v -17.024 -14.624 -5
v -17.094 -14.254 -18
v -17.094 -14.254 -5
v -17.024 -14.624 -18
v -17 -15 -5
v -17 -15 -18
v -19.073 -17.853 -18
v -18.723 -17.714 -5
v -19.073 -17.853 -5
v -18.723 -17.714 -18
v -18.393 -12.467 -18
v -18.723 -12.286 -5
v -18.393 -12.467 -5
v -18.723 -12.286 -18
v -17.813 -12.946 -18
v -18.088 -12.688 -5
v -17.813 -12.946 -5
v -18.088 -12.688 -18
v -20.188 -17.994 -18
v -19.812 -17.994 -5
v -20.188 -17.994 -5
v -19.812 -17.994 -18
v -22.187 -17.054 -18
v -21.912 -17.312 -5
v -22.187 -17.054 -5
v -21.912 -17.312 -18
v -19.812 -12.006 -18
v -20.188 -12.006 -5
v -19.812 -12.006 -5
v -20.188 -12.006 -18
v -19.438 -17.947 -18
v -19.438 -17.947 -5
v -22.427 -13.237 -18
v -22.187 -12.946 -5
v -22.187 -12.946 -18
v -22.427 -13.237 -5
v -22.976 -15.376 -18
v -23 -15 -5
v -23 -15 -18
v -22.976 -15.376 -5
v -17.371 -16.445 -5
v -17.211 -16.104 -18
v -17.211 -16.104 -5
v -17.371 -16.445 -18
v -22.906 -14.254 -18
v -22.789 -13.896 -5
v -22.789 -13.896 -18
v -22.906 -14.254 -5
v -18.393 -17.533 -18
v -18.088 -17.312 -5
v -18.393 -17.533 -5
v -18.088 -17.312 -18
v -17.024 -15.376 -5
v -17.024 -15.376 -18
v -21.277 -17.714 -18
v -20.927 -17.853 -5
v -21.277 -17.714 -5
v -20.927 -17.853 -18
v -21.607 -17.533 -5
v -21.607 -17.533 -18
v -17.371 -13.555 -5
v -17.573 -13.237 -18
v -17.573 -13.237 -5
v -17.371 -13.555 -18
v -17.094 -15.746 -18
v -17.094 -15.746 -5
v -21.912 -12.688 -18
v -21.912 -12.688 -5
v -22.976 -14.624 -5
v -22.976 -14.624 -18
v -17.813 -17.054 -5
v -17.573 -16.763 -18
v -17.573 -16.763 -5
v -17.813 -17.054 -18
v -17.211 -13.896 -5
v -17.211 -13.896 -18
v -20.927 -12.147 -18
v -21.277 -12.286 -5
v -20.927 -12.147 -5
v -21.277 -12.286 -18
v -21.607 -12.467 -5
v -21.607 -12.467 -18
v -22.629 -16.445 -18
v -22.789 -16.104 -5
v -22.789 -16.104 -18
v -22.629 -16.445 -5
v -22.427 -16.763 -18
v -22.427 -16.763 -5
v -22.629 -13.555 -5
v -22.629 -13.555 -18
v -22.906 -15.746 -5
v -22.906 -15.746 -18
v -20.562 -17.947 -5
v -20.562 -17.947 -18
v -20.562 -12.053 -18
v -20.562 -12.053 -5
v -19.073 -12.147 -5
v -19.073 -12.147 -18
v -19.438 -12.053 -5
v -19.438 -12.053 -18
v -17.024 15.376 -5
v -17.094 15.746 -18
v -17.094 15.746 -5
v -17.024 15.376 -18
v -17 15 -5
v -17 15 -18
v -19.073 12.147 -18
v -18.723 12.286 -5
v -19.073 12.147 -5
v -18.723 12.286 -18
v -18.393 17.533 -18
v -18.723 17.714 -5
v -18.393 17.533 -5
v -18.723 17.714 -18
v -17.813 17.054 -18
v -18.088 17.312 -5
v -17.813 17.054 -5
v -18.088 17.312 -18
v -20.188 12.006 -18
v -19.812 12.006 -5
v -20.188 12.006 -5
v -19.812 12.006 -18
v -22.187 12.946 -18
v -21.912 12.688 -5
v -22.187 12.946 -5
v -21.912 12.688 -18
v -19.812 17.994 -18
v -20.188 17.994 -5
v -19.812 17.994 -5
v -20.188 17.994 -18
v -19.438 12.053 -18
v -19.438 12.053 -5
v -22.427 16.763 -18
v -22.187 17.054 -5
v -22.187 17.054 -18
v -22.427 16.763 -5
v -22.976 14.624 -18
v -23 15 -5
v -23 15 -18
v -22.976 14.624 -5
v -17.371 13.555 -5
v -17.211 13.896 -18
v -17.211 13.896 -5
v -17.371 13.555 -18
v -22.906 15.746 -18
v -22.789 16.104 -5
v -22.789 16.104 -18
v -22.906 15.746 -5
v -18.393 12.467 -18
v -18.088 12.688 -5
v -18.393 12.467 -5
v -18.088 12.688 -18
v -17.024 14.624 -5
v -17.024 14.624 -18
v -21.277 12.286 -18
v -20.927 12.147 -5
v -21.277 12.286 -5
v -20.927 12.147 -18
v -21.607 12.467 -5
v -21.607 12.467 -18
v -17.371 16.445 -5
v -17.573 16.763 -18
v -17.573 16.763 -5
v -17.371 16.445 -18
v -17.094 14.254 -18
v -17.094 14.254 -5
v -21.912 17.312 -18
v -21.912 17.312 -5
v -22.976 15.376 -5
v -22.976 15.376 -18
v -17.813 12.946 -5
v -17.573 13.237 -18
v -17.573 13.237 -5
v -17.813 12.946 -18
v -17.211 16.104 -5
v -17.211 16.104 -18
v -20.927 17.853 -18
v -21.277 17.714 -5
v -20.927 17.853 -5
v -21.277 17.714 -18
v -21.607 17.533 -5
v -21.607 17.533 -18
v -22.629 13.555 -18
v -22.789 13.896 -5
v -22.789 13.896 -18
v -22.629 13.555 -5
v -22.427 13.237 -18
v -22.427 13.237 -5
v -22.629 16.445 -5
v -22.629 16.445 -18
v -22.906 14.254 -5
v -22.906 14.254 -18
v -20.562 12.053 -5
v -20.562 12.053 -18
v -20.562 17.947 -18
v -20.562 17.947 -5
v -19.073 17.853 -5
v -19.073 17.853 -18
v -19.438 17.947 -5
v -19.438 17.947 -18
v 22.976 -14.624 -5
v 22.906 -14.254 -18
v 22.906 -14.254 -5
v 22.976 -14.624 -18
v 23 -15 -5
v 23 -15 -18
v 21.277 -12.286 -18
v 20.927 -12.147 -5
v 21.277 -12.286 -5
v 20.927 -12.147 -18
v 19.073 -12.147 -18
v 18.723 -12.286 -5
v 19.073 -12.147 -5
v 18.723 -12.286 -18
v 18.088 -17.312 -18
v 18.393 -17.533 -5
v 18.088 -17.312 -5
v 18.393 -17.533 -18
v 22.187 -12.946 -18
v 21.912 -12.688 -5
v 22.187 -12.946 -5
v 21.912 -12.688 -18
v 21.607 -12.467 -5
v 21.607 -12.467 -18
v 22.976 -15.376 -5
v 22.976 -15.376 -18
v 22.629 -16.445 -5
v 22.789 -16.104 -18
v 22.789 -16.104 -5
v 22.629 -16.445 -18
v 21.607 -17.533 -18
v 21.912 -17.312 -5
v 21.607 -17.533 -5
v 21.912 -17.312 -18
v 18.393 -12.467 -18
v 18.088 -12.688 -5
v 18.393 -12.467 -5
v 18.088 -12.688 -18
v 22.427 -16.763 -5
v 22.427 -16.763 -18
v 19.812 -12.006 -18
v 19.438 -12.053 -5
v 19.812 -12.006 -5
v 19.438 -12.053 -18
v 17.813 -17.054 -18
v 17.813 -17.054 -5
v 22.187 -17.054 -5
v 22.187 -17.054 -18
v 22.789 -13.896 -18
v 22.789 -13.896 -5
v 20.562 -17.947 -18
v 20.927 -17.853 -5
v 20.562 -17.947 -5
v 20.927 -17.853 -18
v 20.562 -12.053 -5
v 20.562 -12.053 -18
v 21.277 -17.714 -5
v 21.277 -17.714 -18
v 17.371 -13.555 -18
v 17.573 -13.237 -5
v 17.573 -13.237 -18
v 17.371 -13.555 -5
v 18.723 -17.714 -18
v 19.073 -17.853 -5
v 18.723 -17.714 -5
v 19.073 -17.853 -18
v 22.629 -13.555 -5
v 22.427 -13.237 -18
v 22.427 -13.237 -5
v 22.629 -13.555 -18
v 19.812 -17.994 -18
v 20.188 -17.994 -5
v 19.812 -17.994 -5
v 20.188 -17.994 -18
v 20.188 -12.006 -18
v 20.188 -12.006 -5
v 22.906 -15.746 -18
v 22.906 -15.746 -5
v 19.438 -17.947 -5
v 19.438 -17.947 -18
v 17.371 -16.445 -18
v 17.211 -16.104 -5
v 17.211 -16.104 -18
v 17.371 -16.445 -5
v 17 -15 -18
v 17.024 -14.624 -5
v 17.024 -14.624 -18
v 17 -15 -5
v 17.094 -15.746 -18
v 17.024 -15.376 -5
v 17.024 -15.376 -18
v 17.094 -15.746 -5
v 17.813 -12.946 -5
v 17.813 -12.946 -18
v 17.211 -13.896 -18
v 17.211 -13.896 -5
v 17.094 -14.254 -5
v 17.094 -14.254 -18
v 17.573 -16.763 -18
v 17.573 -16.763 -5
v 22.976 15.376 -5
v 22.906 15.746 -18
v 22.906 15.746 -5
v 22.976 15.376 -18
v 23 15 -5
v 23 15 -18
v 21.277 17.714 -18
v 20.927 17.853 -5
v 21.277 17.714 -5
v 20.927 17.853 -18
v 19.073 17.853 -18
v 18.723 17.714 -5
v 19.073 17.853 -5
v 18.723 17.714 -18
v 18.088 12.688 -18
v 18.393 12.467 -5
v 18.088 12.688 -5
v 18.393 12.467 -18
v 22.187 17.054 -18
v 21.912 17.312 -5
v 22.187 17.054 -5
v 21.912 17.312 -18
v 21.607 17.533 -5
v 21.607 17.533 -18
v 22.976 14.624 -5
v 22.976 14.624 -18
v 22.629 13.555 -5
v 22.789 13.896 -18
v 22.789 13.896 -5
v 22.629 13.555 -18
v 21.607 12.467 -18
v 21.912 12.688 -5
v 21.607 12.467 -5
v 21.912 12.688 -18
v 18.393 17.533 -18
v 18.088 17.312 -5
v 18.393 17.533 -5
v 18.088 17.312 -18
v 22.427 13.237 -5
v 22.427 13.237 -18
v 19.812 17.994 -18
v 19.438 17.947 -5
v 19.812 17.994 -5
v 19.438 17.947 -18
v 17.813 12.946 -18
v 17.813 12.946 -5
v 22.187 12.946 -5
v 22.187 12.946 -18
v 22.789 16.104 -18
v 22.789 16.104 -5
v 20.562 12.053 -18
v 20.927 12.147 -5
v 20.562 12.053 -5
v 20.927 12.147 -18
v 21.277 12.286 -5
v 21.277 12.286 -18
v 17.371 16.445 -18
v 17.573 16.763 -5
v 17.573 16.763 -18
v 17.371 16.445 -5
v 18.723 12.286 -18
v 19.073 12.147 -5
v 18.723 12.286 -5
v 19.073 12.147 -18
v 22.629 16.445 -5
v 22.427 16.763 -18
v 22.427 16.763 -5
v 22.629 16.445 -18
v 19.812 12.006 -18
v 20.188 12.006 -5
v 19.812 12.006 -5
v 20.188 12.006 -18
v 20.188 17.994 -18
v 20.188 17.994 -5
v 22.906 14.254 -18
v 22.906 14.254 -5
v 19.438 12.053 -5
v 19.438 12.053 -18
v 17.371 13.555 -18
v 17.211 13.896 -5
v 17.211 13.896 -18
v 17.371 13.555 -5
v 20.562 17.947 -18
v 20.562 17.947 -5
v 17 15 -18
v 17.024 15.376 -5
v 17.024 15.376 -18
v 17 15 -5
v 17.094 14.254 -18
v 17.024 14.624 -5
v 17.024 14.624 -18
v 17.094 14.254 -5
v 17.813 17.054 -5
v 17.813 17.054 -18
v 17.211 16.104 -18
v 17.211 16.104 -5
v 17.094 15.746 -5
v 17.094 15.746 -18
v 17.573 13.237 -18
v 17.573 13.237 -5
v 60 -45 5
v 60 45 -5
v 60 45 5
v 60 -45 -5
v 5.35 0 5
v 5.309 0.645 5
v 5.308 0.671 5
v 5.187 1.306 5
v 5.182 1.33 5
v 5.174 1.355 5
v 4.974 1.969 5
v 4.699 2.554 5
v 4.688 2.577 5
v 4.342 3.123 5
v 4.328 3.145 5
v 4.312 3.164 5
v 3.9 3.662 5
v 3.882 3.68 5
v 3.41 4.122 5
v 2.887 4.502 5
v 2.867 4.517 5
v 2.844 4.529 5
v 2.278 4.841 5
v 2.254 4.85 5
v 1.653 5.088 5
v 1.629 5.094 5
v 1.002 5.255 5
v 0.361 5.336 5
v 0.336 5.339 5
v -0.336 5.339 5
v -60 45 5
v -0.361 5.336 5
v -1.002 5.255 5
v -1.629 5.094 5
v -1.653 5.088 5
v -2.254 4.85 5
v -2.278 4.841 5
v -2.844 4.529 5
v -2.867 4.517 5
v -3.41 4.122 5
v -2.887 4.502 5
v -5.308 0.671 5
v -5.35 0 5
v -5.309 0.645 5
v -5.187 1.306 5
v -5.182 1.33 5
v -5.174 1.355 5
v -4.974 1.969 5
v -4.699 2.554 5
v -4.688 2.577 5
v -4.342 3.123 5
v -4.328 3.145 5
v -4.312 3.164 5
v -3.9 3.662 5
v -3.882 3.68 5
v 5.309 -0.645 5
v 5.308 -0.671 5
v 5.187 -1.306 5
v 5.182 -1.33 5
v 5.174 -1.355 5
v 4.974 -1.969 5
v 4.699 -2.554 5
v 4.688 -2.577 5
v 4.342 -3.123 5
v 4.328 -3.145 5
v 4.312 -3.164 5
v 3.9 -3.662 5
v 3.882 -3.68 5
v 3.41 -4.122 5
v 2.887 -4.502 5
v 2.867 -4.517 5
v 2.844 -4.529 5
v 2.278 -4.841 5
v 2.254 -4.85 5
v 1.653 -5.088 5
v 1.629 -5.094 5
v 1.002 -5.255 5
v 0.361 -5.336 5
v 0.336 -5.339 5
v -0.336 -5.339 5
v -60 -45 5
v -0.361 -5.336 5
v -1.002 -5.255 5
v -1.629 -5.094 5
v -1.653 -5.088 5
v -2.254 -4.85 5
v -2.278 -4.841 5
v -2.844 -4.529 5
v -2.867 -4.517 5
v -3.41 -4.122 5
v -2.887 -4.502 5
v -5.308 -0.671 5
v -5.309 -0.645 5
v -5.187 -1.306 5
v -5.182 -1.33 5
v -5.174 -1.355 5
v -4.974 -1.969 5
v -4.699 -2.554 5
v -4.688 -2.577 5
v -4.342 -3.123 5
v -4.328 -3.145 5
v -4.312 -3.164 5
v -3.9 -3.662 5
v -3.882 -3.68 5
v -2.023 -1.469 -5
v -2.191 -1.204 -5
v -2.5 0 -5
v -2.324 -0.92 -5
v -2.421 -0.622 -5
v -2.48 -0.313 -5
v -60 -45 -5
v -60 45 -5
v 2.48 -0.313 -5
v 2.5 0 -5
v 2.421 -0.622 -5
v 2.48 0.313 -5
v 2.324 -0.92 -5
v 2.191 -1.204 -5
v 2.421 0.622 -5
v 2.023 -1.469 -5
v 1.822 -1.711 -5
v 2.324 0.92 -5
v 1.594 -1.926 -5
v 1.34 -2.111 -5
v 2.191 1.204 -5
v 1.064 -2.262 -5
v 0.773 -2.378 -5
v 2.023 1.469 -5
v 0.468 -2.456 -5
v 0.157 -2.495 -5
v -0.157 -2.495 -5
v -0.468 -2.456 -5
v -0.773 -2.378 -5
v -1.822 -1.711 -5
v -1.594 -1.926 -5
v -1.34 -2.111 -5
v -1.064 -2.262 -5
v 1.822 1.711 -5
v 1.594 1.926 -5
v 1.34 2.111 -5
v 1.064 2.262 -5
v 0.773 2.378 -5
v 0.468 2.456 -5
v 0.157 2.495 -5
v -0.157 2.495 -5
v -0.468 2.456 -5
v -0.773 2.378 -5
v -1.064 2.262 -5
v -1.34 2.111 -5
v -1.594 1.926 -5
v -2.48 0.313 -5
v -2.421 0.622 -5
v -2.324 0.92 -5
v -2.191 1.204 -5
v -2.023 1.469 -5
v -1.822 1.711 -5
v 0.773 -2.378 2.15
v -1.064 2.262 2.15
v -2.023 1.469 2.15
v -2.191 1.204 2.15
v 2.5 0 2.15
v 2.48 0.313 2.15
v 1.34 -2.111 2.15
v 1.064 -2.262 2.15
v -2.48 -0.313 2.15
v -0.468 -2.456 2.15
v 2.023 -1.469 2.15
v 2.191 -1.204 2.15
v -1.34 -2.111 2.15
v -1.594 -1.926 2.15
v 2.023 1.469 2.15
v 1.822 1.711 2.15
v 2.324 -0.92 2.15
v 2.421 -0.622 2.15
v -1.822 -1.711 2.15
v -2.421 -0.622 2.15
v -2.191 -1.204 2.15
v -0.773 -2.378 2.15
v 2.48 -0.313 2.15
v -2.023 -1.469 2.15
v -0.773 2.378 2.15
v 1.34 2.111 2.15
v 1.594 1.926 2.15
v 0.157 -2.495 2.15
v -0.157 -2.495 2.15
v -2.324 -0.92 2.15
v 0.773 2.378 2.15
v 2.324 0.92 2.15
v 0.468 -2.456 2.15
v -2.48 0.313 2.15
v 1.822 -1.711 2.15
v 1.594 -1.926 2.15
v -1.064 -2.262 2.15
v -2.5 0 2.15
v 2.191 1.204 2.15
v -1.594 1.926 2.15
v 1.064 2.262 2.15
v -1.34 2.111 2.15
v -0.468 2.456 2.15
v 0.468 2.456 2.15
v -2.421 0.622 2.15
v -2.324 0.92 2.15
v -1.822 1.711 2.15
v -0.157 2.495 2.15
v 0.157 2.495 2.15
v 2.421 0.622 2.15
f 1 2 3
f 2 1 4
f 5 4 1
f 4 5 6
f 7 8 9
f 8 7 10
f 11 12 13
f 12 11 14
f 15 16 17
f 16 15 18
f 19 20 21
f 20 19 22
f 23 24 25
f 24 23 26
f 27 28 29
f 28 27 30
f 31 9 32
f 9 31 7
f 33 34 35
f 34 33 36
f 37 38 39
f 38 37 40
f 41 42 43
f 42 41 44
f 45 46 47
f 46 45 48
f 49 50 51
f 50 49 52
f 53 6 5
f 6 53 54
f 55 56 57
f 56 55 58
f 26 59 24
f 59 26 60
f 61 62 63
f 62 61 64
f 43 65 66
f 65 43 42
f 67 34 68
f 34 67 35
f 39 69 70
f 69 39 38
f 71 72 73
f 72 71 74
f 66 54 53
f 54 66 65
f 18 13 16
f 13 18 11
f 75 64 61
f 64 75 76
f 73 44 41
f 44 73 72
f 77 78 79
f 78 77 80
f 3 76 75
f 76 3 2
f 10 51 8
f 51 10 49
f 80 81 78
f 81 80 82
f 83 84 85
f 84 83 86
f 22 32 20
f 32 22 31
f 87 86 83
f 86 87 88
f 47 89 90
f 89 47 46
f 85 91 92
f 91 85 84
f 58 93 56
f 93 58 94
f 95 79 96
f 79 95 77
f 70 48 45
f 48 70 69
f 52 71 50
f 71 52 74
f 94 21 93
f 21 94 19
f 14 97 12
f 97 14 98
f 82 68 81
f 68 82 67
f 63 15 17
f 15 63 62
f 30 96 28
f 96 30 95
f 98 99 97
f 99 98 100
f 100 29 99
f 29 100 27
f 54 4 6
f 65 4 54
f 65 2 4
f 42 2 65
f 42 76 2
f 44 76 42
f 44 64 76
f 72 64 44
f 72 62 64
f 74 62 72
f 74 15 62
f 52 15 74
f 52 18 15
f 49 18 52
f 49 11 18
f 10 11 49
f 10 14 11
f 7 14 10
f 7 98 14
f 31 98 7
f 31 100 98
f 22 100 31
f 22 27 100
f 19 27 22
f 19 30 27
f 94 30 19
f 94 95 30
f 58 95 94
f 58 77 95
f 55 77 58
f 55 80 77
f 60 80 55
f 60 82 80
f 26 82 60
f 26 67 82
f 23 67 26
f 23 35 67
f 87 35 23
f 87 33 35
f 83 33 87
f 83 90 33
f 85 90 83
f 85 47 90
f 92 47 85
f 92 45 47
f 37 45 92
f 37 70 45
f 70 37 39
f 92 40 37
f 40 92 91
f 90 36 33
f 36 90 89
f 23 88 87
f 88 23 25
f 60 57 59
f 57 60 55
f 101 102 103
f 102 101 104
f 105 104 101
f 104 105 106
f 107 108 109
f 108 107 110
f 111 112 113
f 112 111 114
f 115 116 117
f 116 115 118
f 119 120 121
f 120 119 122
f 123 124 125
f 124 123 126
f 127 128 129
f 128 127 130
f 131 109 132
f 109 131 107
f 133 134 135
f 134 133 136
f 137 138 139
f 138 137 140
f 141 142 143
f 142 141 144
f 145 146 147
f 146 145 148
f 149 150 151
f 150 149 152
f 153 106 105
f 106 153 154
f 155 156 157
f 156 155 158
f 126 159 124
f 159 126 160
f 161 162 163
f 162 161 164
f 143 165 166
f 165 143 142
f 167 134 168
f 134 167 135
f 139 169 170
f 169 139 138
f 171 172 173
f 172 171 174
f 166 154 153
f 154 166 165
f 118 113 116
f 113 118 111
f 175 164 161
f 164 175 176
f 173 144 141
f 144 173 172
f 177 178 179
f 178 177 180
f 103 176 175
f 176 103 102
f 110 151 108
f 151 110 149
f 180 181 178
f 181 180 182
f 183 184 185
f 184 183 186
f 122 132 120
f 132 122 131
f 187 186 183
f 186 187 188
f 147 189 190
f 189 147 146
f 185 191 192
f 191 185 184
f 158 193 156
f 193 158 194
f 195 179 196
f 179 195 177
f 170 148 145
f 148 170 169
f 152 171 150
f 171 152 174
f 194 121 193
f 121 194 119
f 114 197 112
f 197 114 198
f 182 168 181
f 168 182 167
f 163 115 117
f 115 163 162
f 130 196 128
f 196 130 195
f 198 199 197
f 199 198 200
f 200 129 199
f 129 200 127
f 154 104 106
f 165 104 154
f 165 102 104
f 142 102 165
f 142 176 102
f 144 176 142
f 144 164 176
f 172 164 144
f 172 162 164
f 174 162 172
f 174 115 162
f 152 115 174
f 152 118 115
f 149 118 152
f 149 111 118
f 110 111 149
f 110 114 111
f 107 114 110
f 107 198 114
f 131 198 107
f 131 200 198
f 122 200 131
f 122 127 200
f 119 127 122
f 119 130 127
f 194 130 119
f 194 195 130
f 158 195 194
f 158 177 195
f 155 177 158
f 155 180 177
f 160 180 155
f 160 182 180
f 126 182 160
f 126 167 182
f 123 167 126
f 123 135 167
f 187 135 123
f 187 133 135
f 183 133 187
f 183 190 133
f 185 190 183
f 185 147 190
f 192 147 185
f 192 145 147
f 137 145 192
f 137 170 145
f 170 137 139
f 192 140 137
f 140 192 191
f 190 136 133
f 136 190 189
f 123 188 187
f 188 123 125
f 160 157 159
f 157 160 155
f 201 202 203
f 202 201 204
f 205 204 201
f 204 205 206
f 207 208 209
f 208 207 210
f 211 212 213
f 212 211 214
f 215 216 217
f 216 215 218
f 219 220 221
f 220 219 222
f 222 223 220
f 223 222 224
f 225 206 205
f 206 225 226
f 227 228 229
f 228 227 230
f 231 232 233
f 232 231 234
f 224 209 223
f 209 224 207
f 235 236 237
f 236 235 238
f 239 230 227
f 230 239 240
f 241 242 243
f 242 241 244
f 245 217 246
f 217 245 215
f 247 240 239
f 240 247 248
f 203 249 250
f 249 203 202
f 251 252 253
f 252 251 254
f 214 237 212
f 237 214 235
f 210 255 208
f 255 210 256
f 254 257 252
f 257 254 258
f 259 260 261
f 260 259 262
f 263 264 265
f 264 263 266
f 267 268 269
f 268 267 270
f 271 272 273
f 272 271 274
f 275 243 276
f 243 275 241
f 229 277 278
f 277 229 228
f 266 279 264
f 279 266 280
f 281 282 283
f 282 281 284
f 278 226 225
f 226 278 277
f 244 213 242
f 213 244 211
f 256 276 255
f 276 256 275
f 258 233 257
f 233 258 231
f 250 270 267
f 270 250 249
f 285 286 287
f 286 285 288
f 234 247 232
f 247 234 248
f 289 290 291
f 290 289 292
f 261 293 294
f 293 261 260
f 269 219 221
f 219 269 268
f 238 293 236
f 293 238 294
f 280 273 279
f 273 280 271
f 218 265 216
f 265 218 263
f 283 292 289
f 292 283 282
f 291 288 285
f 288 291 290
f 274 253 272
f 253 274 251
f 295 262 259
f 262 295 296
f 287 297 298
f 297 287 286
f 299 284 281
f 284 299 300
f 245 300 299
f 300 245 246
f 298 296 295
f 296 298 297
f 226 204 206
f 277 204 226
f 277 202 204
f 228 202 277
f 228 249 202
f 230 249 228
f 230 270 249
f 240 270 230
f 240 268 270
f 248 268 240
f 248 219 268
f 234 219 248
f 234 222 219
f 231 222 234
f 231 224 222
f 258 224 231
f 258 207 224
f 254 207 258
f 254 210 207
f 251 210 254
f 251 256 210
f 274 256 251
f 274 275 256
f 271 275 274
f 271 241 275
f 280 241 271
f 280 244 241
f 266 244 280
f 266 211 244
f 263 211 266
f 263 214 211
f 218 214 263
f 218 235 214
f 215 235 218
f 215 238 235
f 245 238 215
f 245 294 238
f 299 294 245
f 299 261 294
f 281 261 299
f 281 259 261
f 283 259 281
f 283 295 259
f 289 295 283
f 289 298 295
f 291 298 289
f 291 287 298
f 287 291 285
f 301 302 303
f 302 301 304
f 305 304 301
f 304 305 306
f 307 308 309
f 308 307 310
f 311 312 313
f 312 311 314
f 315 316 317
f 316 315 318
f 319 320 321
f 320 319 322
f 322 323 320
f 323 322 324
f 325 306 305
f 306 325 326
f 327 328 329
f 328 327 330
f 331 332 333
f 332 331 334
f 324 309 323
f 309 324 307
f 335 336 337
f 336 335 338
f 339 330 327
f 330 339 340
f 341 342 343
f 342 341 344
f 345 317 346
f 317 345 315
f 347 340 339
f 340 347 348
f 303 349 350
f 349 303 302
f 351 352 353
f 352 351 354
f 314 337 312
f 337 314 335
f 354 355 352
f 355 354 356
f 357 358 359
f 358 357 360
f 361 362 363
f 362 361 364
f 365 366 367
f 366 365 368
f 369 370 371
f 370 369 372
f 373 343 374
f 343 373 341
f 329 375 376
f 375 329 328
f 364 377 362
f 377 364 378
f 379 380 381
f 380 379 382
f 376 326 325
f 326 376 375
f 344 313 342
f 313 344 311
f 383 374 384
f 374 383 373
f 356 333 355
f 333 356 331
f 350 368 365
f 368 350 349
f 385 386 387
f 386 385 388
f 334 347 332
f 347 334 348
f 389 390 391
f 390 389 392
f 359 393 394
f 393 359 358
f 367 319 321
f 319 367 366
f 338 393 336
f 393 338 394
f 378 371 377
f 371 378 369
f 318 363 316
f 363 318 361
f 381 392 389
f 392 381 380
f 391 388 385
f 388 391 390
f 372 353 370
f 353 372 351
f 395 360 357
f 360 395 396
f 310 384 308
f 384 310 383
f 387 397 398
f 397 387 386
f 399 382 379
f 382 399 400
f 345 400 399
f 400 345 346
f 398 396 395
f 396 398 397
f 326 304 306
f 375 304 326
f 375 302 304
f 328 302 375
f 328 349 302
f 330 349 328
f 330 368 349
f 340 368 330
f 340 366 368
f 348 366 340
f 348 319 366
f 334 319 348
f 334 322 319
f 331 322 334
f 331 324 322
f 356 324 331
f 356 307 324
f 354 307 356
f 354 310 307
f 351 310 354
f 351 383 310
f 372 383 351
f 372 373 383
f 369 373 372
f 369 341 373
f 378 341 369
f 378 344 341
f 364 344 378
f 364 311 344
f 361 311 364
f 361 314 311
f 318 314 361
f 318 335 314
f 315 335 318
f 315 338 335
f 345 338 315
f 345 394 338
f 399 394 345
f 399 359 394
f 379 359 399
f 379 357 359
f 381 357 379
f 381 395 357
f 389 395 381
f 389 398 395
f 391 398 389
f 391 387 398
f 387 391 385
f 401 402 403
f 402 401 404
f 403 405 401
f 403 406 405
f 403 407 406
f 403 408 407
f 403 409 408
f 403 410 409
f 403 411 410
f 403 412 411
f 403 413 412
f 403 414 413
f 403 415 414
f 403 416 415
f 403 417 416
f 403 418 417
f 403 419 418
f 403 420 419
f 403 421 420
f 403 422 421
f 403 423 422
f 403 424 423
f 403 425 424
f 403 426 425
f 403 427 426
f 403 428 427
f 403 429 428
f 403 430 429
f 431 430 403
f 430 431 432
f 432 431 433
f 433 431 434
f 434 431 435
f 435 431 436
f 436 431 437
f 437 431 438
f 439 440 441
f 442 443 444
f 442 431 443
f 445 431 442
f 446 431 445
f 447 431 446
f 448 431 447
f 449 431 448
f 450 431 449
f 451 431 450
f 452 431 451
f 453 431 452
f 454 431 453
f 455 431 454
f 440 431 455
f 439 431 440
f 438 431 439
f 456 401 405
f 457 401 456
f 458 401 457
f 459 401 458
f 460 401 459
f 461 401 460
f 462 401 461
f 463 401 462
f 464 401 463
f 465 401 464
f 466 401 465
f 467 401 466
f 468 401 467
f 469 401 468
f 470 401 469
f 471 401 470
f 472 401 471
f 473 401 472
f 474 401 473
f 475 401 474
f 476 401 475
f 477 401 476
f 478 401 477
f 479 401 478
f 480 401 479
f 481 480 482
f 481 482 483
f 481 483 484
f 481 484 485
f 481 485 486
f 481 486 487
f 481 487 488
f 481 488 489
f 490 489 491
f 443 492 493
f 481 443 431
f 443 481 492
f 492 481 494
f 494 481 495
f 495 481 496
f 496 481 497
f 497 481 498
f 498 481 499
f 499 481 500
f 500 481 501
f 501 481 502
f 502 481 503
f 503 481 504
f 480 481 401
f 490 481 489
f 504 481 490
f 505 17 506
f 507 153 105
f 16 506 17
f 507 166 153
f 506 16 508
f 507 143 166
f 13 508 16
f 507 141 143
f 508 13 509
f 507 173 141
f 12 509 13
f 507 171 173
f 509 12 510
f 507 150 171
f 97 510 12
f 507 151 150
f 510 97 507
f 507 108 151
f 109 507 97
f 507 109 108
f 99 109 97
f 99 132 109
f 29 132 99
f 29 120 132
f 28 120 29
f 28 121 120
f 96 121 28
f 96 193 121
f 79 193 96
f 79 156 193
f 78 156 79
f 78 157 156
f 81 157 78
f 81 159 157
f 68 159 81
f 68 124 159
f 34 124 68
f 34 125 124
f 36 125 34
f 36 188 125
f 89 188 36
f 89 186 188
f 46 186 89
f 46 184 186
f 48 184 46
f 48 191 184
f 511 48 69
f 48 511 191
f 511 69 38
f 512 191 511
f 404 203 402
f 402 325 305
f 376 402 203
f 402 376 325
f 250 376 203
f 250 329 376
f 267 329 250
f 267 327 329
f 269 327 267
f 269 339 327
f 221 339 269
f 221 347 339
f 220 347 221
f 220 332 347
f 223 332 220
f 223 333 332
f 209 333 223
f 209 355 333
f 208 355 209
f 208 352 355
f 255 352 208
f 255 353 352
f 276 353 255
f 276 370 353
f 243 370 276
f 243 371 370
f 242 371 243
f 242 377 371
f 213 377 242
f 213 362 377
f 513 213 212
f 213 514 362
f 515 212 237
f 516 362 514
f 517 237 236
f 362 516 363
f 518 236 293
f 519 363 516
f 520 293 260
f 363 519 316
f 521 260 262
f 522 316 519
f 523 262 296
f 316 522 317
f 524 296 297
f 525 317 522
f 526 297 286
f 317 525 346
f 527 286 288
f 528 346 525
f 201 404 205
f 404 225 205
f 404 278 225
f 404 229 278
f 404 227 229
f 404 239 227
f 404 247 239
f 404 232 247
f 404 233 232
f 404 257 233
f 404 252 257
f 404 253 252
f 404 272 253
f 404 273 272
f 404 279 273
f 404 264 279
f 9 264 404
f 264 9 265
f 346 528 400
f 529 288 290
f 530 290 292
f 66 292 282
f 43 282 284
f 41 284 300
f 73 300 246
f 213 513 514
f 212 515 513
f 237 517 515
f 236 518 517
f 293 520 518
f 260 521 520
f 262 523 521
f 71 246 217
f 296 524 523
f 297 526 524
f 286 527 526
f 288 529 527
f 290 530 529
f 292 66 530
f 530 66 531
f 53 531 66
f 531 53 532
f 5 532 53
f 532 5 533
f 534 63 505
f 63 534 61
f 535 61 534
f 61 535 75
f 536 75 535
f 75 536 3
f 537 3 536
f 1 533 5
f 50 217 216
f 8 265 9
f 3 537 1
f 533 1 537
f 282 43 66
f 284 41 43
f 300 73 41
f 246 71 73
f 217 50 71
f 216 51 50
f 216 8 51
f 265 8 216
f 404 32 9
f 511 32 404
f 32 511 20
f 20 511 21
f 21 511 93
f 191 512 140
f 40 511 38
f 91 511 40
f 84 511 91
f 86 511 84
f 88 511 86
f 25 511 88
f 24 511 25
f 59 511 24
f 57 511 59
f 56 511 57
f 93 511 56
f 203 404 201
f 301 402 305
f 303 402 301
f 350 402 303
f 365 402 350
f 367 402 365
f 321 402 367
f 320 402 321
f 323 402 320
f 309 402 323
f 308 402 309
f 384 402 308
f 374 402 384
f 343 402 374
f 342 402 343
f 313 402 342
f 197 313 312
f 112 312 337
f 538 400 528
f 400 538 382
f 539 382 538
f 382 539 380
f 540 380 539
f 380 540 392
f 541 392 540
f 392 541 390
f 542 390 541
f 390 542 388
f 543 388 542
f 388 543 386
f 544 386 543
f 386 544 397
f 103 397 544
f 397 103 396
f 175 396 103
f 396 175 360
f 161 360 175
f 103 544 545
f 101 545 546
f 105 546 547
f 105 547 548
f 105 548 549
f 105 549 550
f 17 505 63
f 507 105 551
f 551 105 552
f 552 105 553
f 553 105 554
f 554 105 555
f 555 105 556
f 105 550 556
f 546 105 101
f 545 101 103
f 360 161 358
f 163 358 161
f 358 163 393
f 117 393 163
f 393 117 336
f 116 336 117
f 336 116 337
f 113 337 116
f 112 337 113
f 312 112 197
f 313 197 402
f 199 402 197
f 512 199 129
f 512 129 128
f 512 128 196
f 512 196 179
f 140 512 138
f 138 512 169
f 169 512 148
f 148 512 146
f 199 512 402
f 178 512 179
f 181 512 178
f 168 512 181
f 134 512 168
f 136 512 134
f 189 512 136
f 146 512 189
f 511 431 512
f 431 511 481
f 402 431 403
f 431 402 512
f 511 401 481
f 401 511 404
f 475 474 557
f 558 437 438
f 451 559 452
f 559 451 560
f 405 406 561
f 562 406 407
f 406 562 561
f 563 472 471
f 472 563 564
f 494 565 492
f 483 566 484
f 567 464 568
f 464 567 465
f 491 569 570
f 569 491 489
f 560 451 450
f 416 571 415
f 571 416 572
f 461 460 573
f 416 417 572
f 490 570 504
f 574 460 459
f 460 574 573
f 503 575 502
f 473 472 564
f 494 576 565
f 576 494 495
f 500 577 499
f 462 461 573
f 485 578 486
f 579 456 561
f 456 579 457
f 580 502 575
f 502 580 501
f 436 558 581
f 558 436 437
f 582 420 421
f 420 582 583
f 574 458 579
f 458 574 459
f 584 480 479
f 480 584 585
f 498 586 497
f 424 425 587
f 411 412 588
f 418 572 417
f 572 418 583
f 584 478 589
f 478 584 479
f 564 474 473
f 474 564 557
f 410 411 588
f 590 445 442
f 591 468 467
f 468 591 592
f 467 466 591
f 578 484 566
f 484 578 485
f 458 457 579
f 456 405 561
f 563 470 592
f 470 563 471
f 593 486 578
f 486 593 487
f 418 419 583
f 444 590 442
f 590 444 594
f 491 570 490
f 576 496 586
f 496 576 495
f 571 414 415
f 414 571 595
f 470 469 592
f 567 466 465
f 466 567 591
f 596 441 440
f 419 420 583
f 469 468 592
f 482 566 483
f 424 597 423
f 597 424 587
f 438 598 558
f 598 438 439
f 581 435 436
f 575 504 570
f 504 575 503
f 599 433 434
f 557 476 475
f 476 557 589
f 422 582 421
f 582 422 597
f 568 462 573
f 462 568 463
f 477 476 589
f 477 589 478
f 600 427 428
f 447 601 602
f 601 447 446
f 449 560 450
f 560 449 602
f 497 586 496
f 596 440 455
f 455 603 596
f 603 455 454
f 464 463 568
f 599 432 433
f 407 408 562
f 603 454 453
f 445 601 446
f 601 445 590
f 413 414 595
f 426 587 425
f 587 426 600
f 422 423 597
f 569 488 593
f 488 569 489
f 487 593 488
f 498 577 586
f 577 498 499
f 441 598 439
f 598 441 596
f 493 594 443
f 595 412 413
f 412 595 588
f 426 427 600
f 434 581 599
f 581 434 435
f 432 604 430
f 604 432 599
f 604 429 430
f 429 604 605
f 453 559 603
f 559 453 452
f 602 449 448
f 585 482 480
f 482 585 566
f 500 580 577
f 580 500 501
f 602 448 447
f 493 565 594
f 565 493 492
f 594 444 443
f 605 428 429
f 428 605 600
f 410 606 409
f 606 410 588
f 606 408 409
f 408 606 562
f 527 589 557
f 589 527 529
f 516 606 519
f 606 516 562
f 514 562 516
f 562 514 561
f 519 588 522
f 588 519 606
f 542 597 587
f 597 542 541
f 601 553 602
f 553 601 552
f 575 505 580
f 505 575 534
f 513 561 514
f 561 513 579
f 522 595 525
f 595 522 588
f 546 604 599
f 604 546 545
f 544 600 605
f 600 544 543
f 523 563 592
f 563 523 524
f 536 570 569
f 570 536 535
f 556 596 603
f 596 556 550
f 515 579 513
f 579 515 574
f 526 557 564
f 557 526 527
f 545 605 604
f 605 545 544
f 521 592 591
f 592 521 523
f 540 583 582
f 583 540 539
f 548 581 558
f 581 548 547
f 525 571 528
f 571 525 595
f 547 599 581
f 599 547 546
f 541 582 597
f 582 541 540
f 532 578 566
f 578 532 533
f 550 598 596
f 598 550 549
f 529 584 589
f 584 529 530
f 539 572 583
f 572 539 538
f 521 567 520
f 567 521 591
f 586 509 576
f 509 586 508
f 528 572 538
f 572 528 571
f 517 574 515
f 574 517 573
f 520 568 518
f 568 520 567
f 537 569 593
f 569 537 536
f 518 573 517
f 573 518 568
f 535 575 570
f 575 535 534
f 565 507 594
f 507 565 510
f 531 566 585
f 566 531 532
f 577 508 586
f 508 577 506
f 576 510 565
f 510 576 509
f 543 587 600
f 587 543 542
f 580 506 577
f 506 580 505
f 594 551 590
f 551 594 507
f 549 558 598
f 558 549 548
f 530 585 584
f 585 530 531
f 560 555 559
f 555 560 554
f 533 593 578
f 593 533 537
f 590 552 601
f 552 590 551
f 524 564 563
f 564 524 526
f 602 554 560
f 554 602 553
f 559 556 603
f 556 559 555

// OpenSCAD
// file: grooved.cylinder.scad
/**
 * @author OlivierLD
 *
 * Cylinder with toric grrove (for balls)
 * and related widgets (screws, fixing foot)
 *
 * Includes at the bottom many tests and showcases.
 */

use <./mechanical.parts.scad>

/**
 * ringDiam: the ring diameter at its thickest
 * torusDiam: the diametere of the torus
 * => the total diameter would be (ringDiam + torusDiam)
 */
module torus(ringDiam, torusDiam) { 
	rotate_extrude(convexity = ringDiam, $fn = 100) {
		translate([ringDiam / 2, 0, 0]) {
			circle(r = torusDiam / 2, $fn = 100);
		}
	}
} 
 
module groovedCylinder(cylinderHeight, extDiam, torusDiam, intDiam, grooveDiam) {
	difference() {
		cylinder(h=cylinderHeight, d=extDiam, center=true, $fn=100);
		translate([0, 0, (cylinderHeight / 2) + 0.1]) { // Higher than previously, some slack for ball bearings...
			torus(torusDiam, grooveDiam);
		}
		// Hole in the middle
		cylinder(h=cylinderHeight * 1.1, d=intDiam, center=true, $fn=100);
	}
}

module fixingFoot(heightAndLength, width, screwDiam, wallMinThickness) {
	screwLength = 30;
	screwTop = 20;
	difference() {
		rotate([0, -90, 0]) {
			linear_extrude(height=width, center=true) {
				difference() {
					square(heightAndLength, center=true);
					translate([heightAndLength / 2, heightAndLength / 2]) {
						circle(d=heightAndLength, $fn=50);
					}
				}
			}
		}
		rotate([0, 90, 0]) {
			translate([- wallMinThickness - (heightAndLength / 2), wallMinThickness + (heightAndLength / 2), 0]) {
				hull() {
					torus(heightAndLength, width * 0.9); 
				}
			}
		}
		// 0.2: drilling offset
		translate([0, heightAndLength * 0.2, -(screwLength + (heightAndLength / 2) - wallMinThickness)]) {
			metalScrewCS(screwDiam, screwLength, screwTop);
		}
	}
}

// Tests
echo("For tests only");
echo("Use all.parts.scad for printing");

if (true) { // Grooved Cylinder
	cylHeight = 50;
	extDiam = 110;
	torusDiam = 100;
	intDiam = 90;
	ballsDiam = 5;

	groovedCylinder(cylHeight, extDiam, torusDiam, intDiam, ballsDiam);
}

if (false) { // Fixing foot
	fixingFoot(30, 30, 5, 5);
}

if (false) { // Grooved Cylinder with fixing feet
	cylHeight = 50;
	extDiam = 110;
	torusDiam = 100;
	intDiam = 90;
	ballsDiam = 5;
	
	fixingFootSize = 30;
	fixingFootWidth = 30;
	screwDiam = 5;
	screwLen = 30;
	minWallThickness = 5;

	translate([0, 0, cylHeight/ 2]) {
		groovedCylinder(cylHeight, extDiam, torusDiam, intDiam, ballsDiam);
	}
	for (foot = [0:2]) {
		rotate([0, 0, (foot * (360 / 3))]) {
			translate([(extDiam / 2) + ((fixingFootSize / 2) - minWallThickness), 0, 0]) {
				rotate([0, 0, -90]) {
					translate([0, 0, fixingFootSize / 2]) {
						fixingFoot(fixingFootSize, fixingFootWidth, screwDiam, minWallThickness);
					}
				}
			}
		}
	}
}
// file: param.set.04.scad
/**
 * Parameters used for 
 * - printing.scad
 * - the.full.stand.scad
 */
bottomCylinderHeight = 46;
topCylinderHeight = 24;
// Warning: intDiam < torusDiam < extDiam
extDiam = 86;
torusDiam = 76;
intDiam = 66;
ballsDiam = 6;
verticalAxisDiam = 5;

fixingFootSize = 20;
fixingFootWidth = 20;
fixingFootScrewDiam = 4;
// screwLen = 30;
minFootWallThickness = 4;

topBaseFeetInside = true; // For the top base only

wormGearAxisDiam = 5; // Tube  will be twice this diam.
wormGearAxisRadiusOffset = 15;
wormGearAxisHeight = 30;

standWidth = 130;
standLength = 100; 
standHeight = 130;
standTopWidth = 35;
wallThickness = 10;
cylinderThickness = 1;
horizontalAxisDiam = 6;
motorSide = 42.3;
motorDepth = 39;
betweenMotorScrews = 31;
motorAxisDiam = 5;
motorAxisLength = 24;
motorFixingFootScrewDiam = 3; // Might be unsed
flapScrewDiam = 3;

// -- See what this becomes... 
wheelThickness = 10;
bigWheelDiam = 103;
smallWheelDiam = 13; 

bigWheelStandDiam = 80;
bigWheelStandThickness = 10;
// -------------------------

sizeAboveAxis = 70;   // Needs to be bigger than standLength / 2
sizeBelowAxis = 120; 
bracketWidthOutAll = 80; // Can be re-calculated
bracketPlateWidth = 60;
// Must be equal to (bigWheelDiam + smallWheelDiam) / 2
betweenAxis = 58;        // Between main and motor axis. May be re-calculated
counterweightCylinderDiam = 35;

// Wheel stand drilling pattern
//-----------------------------
// For a real one, ActoBotics #615238:
bigWheelStandDrillingDiam = 3;
// Each tuple [radius, angle]
fourHoles = [[ 45.7188023, 17.14134429], [35.19371654, 22.51171482], [28.08199751, 28.67456738], [19.04712535, 45.02701357]];
// Each tuple [angle, radius, diam]
actoBotics615238DrillingPattern = [
	[0 - fourHoles[0][1], fourHoles[0][0], bigWheelStandDrillingDiam],
	[0 - fourHoles[1][1], fourHoles[1][0], bigWheelStandDrillingDiam],
	[0 - fourHoles[2][1], fourHoles[2][0], bigWheelStandDrillingDiam],
	[0 - fourHoles[3][1], fourHoles[3][0], bigWheelStandDrillingDiam],

	[0 + fourHoles[0][1], fourHoles[0][0], bigWheelStandDrillingDiam],
	[0 + fourHoles[1][1], fourHoles[1][0], bigWheelStandDrillingDiam],
	[0 + fourHoles[2][1], fourHoles[2][0], bigWheelStandDrillingDiam],
	[0 + fourHoles[3][1], fourHoles[3][0], bigWheelStandDrillingDiam],

	[90 - fourHoles[0][1], fourHoles[0][0], bigWheelStandDrillingDiam],
	[90 - fourHoles[1][1], fourHoles[1][0], bigWheelStandDrillingDiam],
	[90 - fourHoles[2][1], fourHoles[2][0], bigWheelStandDrillingDiam],
	[90 - fourHoles[3][1], fourHoles[3][0], bigWheelStandDrillingDiam],

	[90 + fourHoles[0][1], fourHoles[0][0], bigWheelStandDrillingDiam],
	[90 + fourHoles[1][1], fourHoles[1][0], bigWheelStandDrillingDiam],
	[90 + fourHoles[2][1], fourHoles[2][0], bigWheelStandDrillingDiam],
	[90 + fourHoles[3][1], fourHoles[3][0], bigWheelStandDrillingDiam],

	[180 - fourHoles[0][1], fourHoles[0][0], bigWheelStandDrillingDiam],
	[180 - fourHoles[1][1], fourHoles[1][0], bigWheelStandDrillingDiam],
	[180 - fourHoles[2][1], fourHoles[2][0], bigWheelStandDrillingDiam],
	[180 - fourHoles[3][1], fourHoles[3][0], bigWheelStandDrillingDiam],

	[180 + fourHoles[0][1], fourHoles[0][0], bigWheelStandDrillingDiam],
	[180 + fourHoles[1][1], fourHoles[1][0], bigWheelStandDrillingDiam],
	[180 + fourHoles[2][1], fourHoles[2][0], bigWheelStandDrillingDiam],
	[180 + fourHoles[3][1], fourHoles[3][0], bigWheelStandDrillingDiam],

	[270 - fourHoles[0][1], fourHoles[0][0], bigWheelStandDrillingDiam],
	[270 - fourHoles[1][1], fourHoles[1][0], bigWheelStandDrillingDiam],
	[270 - fourHoles[2][1], fourHoles[2][0], bigWheelStandDrillingDiam],
	[270 - fourHoles[3][1], fourHoles[3][0], bigWheelStandDrillingDiam],

	[270 + fourHoles[0][1], fourHoles[0][0], bigWheelStandDrillingDiam],
	[270 + fourHoles[1][1], fourHoles[1][0], bigWheelStandDrillingDiam],
	[270 + fourHoles[2][1], fourHoles[2][0], bigWheelStandDrillingDiam],
	[270 + fourHoles[3][1], fourHoles[3][0], bigWheelStandDrillingDiam]
];
// file: mechanical.parts.scad
/**
 * @author OlivierLD
 *
 * Screws, bolts, nuts, washer, ball bearings, etc...
 * To be used as placeholders.
 *
 * Screws specs: 
 * - metric countersunk: https://us.misumi-ec.com/vona2/detail/221005020316/
 * - metric hex bolts: http://stsindustrial.com/a2-hex-cap-screw-technical-data/
 * - metric washers: https://www.mutualscrew.com/department/metric-flat-washers-din-125-11622.cfm
 *
 * Includes at the bottom many tests and showcases.
 */


// Countresunk. [dk, k] dk: head diameter, k head thickness.
M3_CS = [6.72, 1.86];
M4_CS = [8.96, 2.48];
M5_CS = [11.20, 3.1];
M6_CS = [13.44, 3.72];
M8_CS = [17.92, 4.96];

// Hex Nuts and Bolts [h, f]. h: Head thickness, f: head spanner size (ex: M6, f: 10)
M2_HB = [1.525, 4];
M25_HB = [1.825, 5];
M3_HB = [2.125, 5.5];
M4_HB = [2.925, 7];
M5_HB = [3.65, 8];
M6_HB = [4.15, 10];
M8_HB = [5.45, 13];

// Washer, [OD, thickness]
M3_W = [7, 0.55];
M35_W = [8, 0.55];
M4_W = [9, 0.9];
M5_W = [10, 1.1];
M6_W = [12, 1.8];
M8_W = [16, 1.8];

// Ball Bearings [ID, OD, Thickness]
// Warning: do check the data sheet of your ball bearing! Dimensions may vary!
BB_05 = [5, 16, 5];
BB_06 = [6, 19, 6];
BB_08 = [8, 22, 7];

function getBBDims(diam) =  // Ball bearings dims
  (diam == 5) ? BB_05 :
  (diam == 6) ? BB_06 :
	[0, 0];

function getCSScrewDims(diam) = // Countersunk dims
	(diam == 3) ? M3_CS :
	(diam == 4) ? M4_CS :
	(diam == 5) ? M5_CS :
	(diam == 6) ? M6_CS :
	(diam == 8) ? M8_CS :
  [0, 0];

function getHBScrewDims(diam) =  // Hex Bolts and Nuts dims
	(diam == 2) ? M2_HB :
	(diam == 2.5) ? M25_HB :
	(diam == 3) ? M3_HB :
	(diam == 4) ? M4_HB :
	(diam == 5) ? M5_HB :
	(diam == 6) ? M6_HB :
	(diam == 8) ? M8_HB :
  [0, 0];

function getWasherDims(diam) =  // Washer dims
	(diam == 3) ? M3_W :
	(diam == 3.5) ? M35_W :
	(diam == 4) ? M4_W :
	(diam == 5) ? M5_W :
	(diam == 6) ? M6_W :
	(diam == 8) ? M8_W :
  [0, 0];

module ballBearing(id) {
	dims = getBBDims(id); // [id, od, t]
	difference() {
		color("grey", 0.85) {
			cylinder(h=dims[2], d=dims[1], $fn=100, center=true); 
		}
		cylinder(h=dims[2] * 1.1, d=dims[0], $fn=100, center=true); 
	}
}

/**
 * A countersunk metal screw 
 * Can be used for the screw itself, or the hole it needs.
 * diameter can be one of 3, 4, 5, 6, or 8
 * Use a top greater than 0 for difference().
 */
module metalScrewCS(diam, length, top=0) {
	//echo (str("Diam:", diam, "mm"));
	dims = getCSScrewDims(diam);
	dk = dims[0];
	k = dims[1];
	//echo (str("Diam:", diam, "mm, k:", k, ", dk:", dk));
	union() {
		if (top > 0) {
			translate([0, 0, length - 0.01]) {
				cylinder(h=top + 0.01, d=dk, $fn=50);
			}
		}
		translate([0, 0, length - k]) {
			cylinder(h=k, d1=diam, d2=dk, center=false, $fn=50);
		}
		translate([0, 0, 0.1]) {
			cylinder(h=length - k + 0.1, d=diam, $fn=50);
		}
	}
}

/**
 * A hex bolt metal screw 
 * Can be used for the screw itself, or the hole it needs.
 * diameter can be one of 2, 2.5, 3, 4, 5, 6, or 8
 * Use a top greater than 0 for difference().
 */
module metalScrewHB(diam, length, top=0) {
	//echo (str("Diam:", diam, "mm"));
	dims = getHBScrewDims(diam);
	h = dims[0];
	s = dims[1];

	union() {
		if (top > 0) {
			translate([0, 0, length - 0.01]) {
				cylinder(h=top + 0.01, d=s, $fn=6); // 6 faces
			}
		}
		translate([0, 0, length]) {
			cylinder(h=h, d=s, center=false, $fn=6); // 6 faces
		}
		translate([0, 0, 0.1]) {
			cylinder(h=length + 0.1, d=diam, $fn=50);
		}
	}
}

/**
 * A hex nut
 * Can be used for the nut itself, or the hole it needs.
 * diameter can be one of 2, 2.5, 3, 4, 5, 6, or 8
 * Use a top greater than 0 for difference().
 */
module hexNut(diam, top=0) {
	//echo (str("Diam:", diam, "mm"));
	dims = getHBScrewDims(diam);
	h = dims[0];
	s = dims[1];

	length = 0;
	
	difference() {
		union() {
			if (top > 0) {
				translate([0, 0, length - 0.01]) {
					cylinder(h=top + 0.01, d=s, $fn=6); // 6 faces
				}
			}
			translate([0, 0, length]) {
				cylinder(h=h, d=s, center=false, $fn=6); // 6 faces
			}
		}
		translate([0, 0, -2]) {
			cylinder(h=h + 4, d=diam, $fn=50);
		}
	}
}

/**
 * A washer
 * Can be used for the washer itself, or the hole it needs.
 * diameter can be one of 2, 2.5, 3, 4, 5, 6, or 8
 * Use a top greater than 0 for difference().
 */
module washer(diam, top=0) {
	//echo (str("Diam:", diam, "mm"));
	dims = getWasherDims(diam);
	od = dims[0];
	t = dims[1];

	length = 0;
	
	difference() {
		union() {
			if (top > 0) {
				translate([0, 0, length - 0.01]) {
					cylinder(h=t + 0.01, d=od, $fn=50); 
				}
			}
			translate([0, 0, length]) {
				cylinder(h=t, d=od, center=false, $fn=50);
			}
		}
		translate([0, 0, -2]) {
			cylinder(h=t + 4, d=diam, $fn=50);
		}
	}
}

// Tests
echo("For tests only");

if (false) { // CS Screw test
	screwDiam = 5;
	screwLen = 30;

	translate([-20, 0, 0]) {
		metalScrewCS(screwDiam, screwLen);
	}
	translate([20, 0, 0]) {
		difference() {
			cube(16);
			translate([8, 8, -20]) { // Try #translate ;)
				metalScrewCS(screwDiam, screwLen, 10);
			}
		}
	}
	
	for (i=[3, 4, 5, 6, 8]) {
		translate([-15 * i, 0, 0]) {
			metalScrewCS(i, screwLen);
		}
	}
}

if (false) { // HB Screw test
	screwLen = 30;

	translate([20, 0, 0]) {
		difference() {
			cube(16);
			translate([8, 8, -23.5]) { // Try #translate ;)
				metalScrewHB(6, screwLen, 10);
			}
		}
	}

	for (i=[2, 2.5, 3, 4, 5, 6, 8]) {
		translate([-15 * i, 0, 0]) {
			metalScrewHB(i, screwLen);
		}
	}
}

if (false) { // Hex Nut test
	
	cubeSize = 16;
	diam = 6;
	translate([20, 5, 0]) {
		difference() {
			cube(cubeSize);
			translate([cubeSize / 2, cubeSize / 2, cubeSize - getHBScrewDims(6)[0]]) { // Try #translate ;)
				hexNut(diam, top=10); 
			}
		}
	}

	translate([20, - 5 - cubeSize, 0]) {
		difference() {
			cube(cubeSize);
			translate([cubeSize / 2, cubeSize / 2, cubeSize - getHBScrewDims(6)[0]]) { // Try #translate ;)
				hull() { hexNut(diam, top=10); }
			}
		}
	}

	for (i=[2, 2.5, 3, 4, 5, 6, 8]) {
		translate([-15 * i, 0, 0]) {
			hexNut(i);
		}
	}
}

if (false) { // Washer test
	cubeSize = 16;
	diam = 6;
	translate([20, 5, 0]) {
		difference() {
			cube(cubeSize);
			translate([cubeSize / 2, cubeSize / 2, cubeSize - getWasherDims(6)[1] + 0.05]) { // Try #translate ;)
				washer(diam, top=10); 
			}
		}
	}

	translate([20, - 5 - cubeSize, 0]) {
		difference() {
			cube(cubeSize);
			translate([cubeSize / 2, cubeSize / 2, cubeSize - getWasherDims(6)[1] + 0.05]) { // Try #translate ;)
				hull() { washer(diam, top=10); }
			}
		}
	}

	for (i=[3, 3.5, 3, 4, 5, 6, 8]) {
		translate([-15 * i, 0, 0]) {
			washer(i);
		}
	}
}

// Nut bolt washer
if (false) {
	diam = 6;
	screwLen = 30;
	
	translate([- screwLen / 2, 0, 0]) {
		rotate([0, 90, 0]) {
			color("cyan") {
				metalScrewHB(diam, screwLen);
			}
			translate([0, 0, 15]) {
				color("red") {
					washer(diam);
				}
			}
			translate([0, 0, 5]) {
				color("green") {
					hexNut(diam);
				}
			}
		}
	}
}

// Ball bearing test
if (true) {
	for (i=[5, 6]) {
		translate([-20 * (i - 5), 0, 0]) {
			ballBearing(i);
		}
	}
}
// main file
/**
 * @author OlivierLD
 * 2020-Jan-28
 *
 * Printing with a set of parameters, 
 * included below.
 */
use <./mechanical.parts.scad> 
use <./all.parts.scad>
use <./parts.printer.scad>

// Options, dimensions, parameters
include <./param.set.04.scad>

// Execution

echo(">>> ------------------------------------------------------");
echo(">>> After adjusting the values,");
echo(">>> Choose the part to design below.");
echo(">>> ------------------------------------------------------");

PRINT_BRACKET = 1;
PRINT_BASE_1 = 2;
PRINT_BASE_2 = 3;
PRINT_MAIN_STAND = 4;
PRINT_COUNTERWEIGHT_CYLINDER = 5;
PRINT_BIG_WHEEL_STAND = 6;
PRINT_BALL_BEARING_STAND = 7;
PRINT_PANEL_PLATE = 8;

// Choose your own here
option = PRINT_PANEL_PLATE;

if (option == PRINT_BRACKET) {
	printBracket(horizontalAxisDiam,
							 sizeAboveAxis,
							 sizeBelowAxis,
							 bracketWidthOutAll,
							 wallThickness,
							 bracketPlateWidth,
							 betweenAxis, // between main axis and motor axis
							 counterweightCylinderDiam,
							 withMotor=false,
							 withCylinder=false);
} else if (option == PRINT_BASE_1) {
	printBase1(bottomCylinderHeight, 
						 extDiam, 
						 torusDiam, 
						 intDiam, 
						 ballsDiam, 
						 fixingFootSize, 
						 fixingFootWidth, 
						 fixingFootScrewDiam, 
						 minFootWallThickness,
						 verticalAxisDiam,
						 wormGearAxisDiam * 2,
						 wormGearAxisRadiusOffset, 
						 wormGearAxisHeight);
} else if (option == PRINT_BASE_2) {
	printBase2(topCylinderHeight, 
						 extDiam, 
						 torusDiam, 
						 intDiam, 
						 ballsDiam, 
						 fixingFootSize, 
						 fixingFootWidth, 
						 fixingFootScrewDiam, 
						 minFootWallThickness,
						 feetInside = topBaseFeetInside);
} else if (option == PRINT_COUNTERWEIGHT_CYLINDER) {
	printCylinder(bracketWidthOutAll, wallThickness, counterweightCylinderDiam);
} else if (option == PRINT_MAIN_STAND) {
	printMainStand(standWidth, 
								 standLength, 
								 standHeight, 
								 standTopWidth, 
								 wallThickness, 
								 verticalAxisDiam,
								 horizontalAxisDiam, 
								 flapScrewDiam,
								 extDiam, 
								 fixingFootSize, 
								 fixingFootScrewDiam, 
								 minFootWallThickness,
								 topFeetInside=topBaseFeetInside,
								 wheelStandThickness=bigWheelStandThickness,
								 wheelStandDrillingPattern=actoBotics615238DrillingPattern);
} else if (option == PRINT_BALL_BEARING_STAND) {
	printBallBearingStand(wormGearAxisDiam,
												wormGearAxisHeight,
												fixingFootSize, 
												fixingFootWidth, 
												fixingFootScrewDiam, 
												minFootWallThickness);
} else if (option == PRINT_BIG_WHEEL_STAND) {
	printBigWheelStand(bigWheelStandDiam, 
										 horizontalAxisDiam, 
										 bigWheelStandThickness, 
										 actoBotics615238DrillingPattern);
} else if (option == PRINT_PANEL_PLATE) {
	panelStandPlate(wallThickness, bracketPlateWidth, bracketWidthOutAll);
}
// customPrint();
